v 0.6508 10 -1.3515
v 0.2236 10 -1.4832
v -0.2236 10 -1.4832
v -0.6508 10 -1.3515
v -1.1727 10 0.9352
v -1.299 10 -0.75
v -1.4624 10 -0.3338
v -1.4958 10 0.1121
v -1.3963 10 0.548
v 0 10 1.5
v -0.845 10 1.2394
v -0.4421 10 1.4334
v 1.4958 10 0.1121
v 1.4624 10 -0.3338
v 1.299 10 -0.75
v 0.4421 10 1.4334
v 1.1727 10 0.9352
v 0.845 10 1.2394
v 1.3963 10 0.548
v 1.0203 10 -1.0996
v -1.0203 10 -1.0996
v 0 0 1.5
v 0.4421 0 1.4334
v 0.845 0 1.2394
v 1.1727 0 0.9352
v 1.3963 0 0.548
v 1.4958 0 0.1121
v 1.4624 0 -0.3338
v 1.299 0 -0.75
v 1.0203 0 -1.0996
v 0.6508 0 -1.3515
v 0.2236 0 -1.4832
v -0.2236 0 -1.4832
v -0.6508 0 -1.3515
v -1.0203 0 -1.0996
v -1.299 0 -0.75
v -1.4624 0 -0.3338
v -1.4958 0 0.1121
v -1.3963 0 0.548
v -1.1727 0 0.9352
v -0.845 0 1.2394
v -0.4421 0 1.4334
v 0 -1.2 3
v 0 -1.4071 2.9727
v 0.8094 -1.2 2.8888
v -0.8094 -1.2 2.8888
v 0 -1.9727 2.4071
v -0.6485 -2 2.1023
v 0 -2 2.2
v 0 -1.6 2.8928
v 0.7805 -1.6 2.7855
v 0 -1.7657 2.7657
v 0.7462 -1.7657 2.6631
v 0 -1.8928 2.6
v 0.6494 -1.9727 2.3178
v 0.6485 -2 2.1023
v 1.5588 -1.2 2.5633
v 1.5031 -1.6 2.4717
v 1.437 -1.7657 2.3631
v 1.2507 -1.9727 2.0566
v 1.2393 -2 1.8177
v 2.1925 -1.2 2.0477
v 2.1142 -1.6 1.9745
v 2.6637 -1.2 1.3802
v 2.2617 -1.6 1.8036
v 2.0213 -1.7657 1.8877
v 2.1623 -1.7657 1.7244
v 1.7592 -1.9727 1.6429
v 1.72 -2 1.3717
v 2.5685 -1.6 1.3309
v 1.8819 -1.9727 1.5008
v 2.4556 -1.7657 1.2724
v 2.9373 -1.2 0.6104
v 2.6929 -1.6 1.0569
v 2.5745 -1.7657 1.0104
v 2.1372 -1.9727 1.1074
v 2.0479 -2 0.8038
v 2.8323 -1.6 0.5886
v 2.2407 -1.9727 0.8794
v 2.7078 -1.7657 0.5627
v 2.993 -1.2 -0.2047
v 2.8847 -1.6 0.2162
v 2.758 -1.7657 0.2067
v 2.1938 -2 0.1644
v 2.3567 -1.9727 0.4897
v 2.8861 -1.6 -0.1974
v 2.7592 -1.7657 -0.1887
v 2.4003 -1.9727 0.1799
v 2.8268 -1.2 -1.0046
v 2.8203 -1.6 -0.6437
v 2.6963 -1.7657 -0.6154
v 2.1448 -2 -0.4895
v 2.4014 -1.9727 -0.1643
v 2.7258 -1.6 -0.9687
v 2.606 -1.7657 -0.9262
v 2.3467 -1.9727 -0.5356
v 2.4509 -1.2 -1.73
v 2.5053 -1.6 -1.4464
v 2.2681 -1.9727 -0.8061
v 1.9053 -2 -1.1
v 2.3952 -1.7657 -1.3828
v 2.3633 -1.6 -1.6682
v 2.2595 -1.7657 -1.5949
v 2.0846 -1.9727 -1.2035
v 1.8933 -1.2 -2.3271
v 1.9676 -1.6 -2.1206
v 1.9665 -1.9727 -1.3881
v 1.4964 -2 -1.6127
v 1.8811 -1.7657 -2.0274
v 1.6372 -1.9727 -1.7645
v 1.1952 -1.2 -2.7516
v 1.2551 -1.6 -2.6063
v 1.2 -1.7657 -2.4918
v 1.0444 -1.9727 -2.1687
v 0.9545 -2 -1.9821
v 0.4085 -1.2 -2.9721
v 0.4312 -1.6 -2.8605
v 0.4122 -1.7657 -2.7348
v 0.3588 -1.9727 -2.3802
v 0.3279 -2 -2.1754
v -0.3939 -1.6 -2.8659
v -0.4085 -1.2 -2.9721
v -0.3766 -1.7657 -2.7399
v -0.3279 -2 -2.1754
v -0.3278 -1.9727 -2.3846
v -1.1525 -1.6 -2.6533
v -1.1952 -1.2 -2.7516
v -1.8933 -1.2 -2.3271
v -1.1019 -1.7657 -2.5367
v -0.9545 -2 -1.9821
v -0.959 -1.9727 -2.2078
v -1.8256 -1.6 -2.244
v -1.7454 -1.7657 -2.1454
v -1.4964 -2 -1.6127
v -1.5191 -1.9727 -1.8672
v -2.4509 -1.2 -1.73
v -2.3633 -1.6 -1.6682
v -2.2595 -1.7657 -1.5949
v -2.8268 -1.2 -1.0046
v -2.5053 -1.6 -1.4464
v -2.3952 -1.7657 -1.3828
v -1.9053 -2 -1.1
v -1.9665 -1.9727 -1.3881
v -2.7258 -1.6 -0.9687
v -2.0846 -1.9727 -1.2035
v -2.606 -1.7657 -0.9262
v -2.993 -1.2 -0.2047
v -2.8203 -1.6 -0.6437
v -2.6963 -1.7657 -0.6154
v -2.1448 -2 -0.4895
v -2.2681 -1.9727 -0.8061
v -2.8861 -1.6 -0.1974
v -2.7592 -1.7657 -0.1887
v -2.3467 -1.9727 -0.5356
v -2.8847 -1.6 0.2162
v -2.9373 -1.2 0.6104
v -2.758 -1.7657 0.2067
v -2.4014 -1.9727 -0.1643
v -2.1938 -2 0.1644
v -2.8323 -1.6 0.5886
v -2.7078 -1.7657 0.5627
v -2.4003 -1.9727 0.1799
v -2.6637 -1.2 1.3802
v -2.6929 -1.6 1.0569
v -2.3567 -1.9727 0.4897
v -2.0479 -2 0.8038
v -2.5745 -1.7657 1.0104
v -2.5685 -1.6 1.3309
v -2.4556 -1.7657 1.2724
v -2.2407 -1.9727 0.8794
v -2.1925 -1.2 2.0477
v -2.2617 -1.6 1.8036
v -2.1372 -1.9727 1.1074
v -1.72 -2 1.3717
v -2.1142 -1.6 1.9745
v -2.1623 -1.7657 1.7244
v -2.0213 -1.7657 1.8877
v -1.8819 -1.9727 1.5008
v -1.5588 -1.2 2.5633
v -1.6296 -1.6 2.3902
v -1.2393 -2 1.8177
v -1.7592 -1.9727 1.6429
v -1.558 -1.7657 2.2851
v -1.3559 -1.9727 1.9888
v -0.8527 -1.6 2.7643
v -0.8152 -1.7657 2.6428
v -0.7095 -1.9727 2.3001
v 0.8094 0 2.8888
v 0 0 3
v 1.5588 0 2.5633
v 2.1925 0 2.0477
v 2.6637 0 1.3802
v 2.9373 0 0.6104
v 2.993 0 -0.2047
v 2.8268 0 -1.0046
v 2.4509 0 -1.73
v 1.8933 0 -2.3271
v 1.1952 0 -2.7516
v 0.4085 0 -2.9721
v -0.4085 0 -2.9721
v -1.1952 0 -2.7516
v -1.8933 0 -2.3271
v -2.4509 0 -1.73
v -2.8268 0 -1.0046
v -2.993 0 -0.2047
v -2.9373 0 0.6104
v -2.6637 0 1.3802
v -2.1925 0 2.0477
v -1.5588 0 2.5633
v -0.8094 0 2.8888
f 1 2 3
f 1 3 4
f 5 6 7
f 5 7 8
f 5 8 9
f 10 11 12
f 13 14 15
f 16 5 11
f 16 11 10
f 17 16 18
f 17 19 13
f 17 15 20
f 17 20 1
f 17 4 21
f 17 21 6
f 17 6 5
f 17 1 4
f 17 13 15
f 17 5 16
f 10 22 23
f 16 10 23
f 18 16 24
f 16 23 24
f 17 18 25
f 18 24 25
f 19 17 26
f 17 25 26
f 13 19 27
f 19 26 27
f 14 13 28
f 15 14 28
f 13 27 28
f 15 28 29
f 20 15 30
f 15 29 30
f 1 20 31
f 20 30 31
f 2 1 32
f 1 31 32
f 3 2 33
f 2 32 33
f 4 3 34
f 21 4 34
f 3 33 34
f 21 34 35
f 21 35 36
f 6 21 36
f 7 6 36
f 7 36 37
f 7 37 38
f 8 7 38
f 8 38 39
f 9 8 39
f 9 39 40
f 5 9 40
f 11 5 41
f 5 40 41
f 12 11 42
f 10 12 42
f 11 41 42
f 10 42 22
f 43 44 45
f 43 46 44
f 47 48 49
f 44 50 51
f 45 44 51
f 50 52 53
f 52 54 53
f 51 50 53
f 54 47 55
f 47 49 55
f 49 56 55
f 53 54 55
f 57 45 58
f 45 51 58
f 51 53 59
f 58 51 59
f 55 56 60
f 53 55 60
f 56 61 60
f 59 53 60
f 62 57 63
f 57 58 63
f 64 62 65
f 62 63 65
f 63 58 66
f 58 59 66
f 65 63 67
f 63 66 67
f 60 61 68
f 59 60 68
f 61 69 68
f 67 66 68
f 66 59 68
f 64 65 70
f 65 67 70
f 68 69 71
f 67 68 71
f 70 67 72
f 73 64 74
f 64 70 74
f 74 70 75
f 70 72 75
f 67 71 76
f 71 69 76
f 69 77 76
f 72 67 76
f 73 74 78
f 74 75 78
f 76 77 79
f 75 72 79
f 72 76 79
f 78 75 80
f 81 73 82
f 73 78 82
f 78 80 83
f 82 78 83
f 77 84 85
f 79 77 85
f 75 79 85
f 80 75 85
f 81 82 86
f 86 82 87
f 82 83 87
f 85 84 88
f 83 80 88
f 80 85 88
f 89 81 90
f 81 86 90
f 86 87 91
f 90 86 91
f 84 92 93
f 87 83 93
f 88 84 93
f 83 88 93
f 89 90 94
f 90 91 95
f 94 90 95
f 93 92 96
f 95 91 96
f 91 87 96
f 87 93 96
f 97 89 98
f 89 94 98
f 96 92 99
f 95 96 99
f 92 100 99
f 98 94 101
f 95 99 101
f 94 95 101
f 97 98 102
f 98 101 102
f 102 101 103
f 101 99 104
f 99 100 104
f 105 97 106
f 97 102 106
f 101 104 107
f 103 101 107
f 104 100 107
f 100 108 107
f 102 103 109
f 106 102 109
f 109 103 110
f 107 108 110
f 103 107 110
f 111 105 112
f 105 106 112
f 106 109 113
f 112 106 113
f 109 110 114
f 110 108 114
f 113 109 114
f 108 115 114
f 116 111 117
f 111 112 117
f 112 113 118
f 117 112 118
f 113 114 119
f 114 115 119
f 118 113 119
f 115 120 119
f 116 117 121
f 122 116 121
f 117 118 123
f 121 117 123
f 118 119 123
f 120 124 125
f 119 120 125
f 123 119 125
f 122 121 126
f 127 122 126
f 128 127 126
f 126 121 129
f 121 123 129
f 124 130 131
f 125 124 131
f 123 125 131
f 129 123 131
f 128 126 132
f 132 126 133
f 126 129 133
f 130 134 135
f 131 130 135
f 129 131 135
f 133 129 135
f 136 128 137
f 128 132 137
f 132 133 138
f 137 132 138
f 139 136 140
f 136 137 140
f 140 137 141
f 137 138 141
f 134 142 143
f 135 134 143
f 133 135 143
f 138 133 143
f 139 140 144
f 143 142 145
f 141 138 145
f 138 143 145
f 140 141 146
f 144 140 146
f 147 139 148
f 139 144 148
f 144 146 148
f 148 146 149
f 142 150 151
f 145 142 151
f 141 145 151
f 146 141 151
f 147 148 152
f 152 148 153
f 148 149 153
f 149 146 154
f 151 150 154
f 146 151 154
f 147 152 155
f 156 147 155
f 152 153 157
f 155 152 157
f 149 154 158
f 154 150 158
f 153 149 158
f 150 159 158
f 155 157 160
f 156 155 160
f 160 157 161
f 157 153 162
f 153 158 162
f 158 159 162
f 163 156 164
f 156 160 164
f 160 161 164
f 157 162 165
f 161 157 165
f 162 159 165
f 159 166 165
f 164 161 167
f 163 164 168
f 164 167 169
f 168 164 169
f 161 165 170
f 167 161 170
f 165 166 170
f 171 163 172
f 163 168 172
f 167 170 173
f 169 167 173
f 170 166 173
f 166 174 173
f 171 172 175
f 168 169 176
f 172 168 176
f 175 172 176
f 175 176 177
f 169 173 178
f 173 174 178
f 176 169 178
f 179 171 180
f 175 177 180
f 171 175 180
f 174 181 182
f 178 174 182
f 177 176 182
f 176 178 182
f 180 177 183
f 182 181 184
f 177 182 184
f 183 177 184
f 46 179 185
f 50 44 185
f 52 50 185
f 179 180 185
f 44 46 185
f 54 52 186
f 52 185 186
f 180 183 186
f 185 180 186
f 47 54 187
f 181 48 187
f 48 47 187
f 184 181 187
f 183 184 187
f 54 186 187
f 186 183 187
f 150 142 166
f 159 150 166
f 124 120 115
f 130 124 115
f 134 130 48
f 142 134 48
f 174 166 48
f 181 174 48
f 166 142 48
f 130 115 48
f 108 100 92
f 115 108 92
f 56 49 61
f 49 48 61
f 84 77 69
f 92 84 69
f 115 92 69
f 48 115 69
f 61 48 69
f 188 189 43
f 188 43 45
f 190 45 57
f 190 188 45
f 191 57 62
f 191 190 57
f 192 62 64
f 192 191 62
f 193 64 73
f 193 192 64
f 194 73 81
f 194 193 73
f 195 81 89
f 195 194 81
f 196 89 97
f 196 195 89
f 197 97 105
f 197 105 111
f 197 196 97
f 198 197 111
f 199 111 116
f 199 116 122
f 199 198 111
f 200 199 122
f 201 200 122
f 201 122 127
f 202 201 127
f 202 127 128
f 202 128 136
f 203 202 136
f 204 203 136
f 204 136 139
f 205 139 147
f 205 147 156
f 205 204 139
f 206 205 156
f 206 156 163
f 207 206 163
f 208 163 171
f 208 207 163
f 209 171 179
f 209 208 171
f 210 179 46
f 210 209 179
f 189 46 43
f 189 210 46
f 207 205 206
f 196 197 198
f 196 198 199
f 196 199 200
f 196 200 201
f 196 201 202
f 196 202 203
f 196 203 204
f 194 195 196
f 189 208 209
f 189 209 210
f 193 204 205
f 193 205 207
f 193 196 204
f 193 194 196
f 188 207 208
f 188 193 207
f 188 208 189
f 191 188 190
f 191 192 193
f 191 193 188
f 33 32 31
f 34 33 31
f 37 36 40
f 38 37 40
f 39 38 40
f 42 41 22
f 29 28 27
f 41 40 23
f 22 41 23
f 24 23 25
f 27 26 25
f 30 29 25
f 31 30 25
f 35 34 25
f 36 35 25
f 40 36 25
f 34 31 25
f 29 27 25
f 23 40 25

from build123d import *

# Parameters (mm, degrees)
ESBO_O1_R                = 1.5
RESSALTO_EXTRUS_O1_DEPTH = 10
ESBO_O1_3_R              = 3
RESSALTO_EXTRUS_O2_DEPTH = 2
FILETE1_R                = 0.8


with BuildPart() as part:
    # Esboço1 → Ressalto-extrusão1 (new body)
    with BuildSketch(Plane(origin=(0, 0, 0), x_dir=(1, 0, 0), z_dir=(0, 1, 0))):
        Circle(ESBO_O1_R)
    extrude(amount=RESSALTO_EXTRUS_O1_DEPTH)


with BuildPart() as body_2:
    # Esboço1<3> → Ressalto-extrusão2 (new body)
    with BuildSketch(Plane(origin=(0, 0, 0), x_dir=(1, 0, 0), z_dir=(0, 1, 0))):
        Circle(ESBO_O1_3_R)
    extrude(amount=-RESSALTO_EXTRUS_O2_DEPTH)

    # Filete1
    filete1_edges = [body_2.edges().sort_by_distance(p)[0] for p in [
        (-3, -2, 0),
    ]]
    fillet(filete1_edges, radius=FILETE1_R)


solid = Compound([part.part, body_2.part])
